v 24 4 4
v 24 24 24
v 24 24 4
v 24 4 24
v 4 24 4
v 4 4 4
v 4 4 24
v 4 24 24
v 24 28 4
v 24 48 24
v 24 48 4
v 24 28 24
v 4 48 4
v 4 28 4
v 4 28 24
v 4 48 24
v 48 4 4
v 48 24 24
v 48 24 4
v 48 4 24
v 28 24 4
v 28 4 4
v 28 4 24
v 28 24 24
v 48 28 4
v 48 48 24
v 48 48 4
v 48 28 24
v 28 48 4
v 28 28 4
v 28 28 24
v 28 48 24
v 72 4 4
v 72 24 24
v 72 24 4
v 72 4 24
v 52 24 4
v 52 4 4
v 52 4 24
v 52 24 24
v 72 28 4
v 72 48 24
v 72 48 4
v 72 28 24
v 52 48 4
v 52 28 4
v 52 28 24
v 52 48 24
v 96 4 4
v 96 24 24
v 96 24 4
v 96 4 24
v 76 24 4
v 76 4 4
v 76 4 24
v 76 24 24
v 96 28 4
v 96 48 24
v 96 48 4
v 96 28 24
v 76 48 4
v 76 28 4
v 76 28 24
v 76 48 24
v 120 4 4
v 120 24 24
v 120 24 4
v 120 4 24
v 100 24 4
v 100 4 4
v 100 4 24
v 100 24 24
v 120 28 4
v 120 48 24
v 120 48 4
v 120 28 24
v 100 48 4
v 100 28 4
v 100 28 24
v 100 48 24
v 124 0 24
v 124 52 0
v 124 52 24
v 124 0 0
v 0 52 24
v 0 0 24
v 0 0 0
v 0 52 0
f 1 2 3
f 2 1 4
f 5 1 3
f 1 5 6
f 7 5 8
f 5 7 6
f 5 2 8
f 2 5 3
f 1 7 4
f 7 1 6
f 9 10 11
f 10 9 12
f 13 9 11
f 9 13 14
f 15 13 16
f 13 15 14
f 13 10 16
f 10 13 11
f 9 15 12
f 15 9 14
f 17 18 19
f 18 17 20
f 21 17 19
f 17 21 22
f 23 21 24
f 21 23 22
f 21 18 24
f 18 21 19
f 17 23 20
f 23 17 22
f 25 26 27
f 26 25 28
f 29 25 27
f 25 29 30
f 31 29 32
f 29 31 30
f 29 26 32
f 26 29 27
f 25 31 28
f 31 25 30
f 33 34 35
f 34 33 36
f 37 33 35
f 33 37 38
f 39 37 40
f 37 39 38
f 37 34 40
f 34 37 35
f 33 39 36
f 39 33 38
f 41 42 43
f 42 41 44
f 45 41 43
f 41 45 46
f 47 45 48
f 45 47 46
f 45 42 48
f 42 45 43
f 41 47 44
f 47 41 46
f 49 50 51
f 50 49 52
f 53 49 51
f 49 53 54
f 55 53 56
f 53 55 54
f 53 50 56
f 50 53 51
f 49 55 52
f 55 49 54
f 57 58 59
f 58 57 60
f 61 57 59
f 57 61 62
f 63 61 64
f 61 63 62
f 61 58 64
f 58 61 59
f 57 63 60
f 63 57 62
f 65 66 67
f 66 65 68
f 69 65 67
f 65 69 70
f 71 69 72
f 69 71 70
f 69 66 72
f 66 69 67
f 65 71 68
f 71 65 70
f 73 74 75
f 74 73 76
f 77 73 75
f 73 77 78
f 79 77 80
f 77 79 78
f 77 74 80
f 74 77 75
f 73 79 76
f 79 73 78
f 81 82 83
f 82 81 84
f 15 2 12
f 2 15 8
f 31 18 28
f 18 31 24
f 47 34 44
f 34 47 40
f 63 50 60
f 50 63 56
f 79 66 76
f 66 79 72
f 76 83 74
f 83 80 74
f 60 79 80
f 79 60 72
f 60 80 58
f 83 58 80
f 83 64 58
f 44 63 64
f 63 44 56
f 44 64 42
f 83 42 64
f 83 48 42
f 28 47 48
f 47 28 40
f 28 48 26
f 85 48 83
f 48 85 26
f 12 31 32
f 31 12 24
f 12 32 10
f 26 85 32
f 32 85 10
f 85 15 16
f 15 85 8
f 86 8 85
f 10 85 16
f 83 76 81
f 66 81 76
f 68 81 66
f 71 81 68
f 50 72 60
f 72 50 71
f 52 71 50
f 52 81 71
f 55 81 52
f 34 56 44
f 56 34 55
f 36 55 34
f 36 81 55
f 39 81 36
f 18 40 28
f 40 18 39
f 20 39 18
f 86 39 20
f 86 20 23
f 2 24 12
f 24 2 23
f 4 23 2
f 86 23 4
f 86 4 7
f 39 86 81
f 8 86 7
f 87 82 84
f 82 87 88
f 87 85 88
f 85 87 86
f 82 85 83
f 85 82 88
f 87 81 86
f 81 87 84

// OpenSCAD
// Ten frame generation script
//
// enter size of each cube/space as cubesize
// enter number of cubes/spaces across in framecount
// enter how many rows of the frame as rowcount
//
// Designed by: John Yang
// Thingiverse user: ljyang
// released CC-BY-SA

//	Size of hole
cube_size=20; // [1:30]
// Number of holes in frame
frame_size=5; // [1:20]
// Number of rows in frame
row_count=2; // [1:20]

hidden_wallsize=cube_size*0.2;
hidden_cubeandwall=cube_size + hidden_wallsize;
hidden_totalwidth=row_count*hidden_cubeandwall + hidden_wallsize;
hidden_totallength=frame_size*hidden_cubeandwall + hidden_wallsize;

difference(){
	cube([hidden_totallength,hidden_totalwidth,hidden_cubeandwall]);
	for (i = [0:frame_size-1]){
		for (j = [0:row_count-1]){
			translate([(i*hidden_cubeandwall + hidden_wallsize),(j*hidden_cubeandwall + hidden_wallsize),hidden_wallsize]) cube([cube_size,cube_size,hidden_cubeandwall]);
		}
	}
}
